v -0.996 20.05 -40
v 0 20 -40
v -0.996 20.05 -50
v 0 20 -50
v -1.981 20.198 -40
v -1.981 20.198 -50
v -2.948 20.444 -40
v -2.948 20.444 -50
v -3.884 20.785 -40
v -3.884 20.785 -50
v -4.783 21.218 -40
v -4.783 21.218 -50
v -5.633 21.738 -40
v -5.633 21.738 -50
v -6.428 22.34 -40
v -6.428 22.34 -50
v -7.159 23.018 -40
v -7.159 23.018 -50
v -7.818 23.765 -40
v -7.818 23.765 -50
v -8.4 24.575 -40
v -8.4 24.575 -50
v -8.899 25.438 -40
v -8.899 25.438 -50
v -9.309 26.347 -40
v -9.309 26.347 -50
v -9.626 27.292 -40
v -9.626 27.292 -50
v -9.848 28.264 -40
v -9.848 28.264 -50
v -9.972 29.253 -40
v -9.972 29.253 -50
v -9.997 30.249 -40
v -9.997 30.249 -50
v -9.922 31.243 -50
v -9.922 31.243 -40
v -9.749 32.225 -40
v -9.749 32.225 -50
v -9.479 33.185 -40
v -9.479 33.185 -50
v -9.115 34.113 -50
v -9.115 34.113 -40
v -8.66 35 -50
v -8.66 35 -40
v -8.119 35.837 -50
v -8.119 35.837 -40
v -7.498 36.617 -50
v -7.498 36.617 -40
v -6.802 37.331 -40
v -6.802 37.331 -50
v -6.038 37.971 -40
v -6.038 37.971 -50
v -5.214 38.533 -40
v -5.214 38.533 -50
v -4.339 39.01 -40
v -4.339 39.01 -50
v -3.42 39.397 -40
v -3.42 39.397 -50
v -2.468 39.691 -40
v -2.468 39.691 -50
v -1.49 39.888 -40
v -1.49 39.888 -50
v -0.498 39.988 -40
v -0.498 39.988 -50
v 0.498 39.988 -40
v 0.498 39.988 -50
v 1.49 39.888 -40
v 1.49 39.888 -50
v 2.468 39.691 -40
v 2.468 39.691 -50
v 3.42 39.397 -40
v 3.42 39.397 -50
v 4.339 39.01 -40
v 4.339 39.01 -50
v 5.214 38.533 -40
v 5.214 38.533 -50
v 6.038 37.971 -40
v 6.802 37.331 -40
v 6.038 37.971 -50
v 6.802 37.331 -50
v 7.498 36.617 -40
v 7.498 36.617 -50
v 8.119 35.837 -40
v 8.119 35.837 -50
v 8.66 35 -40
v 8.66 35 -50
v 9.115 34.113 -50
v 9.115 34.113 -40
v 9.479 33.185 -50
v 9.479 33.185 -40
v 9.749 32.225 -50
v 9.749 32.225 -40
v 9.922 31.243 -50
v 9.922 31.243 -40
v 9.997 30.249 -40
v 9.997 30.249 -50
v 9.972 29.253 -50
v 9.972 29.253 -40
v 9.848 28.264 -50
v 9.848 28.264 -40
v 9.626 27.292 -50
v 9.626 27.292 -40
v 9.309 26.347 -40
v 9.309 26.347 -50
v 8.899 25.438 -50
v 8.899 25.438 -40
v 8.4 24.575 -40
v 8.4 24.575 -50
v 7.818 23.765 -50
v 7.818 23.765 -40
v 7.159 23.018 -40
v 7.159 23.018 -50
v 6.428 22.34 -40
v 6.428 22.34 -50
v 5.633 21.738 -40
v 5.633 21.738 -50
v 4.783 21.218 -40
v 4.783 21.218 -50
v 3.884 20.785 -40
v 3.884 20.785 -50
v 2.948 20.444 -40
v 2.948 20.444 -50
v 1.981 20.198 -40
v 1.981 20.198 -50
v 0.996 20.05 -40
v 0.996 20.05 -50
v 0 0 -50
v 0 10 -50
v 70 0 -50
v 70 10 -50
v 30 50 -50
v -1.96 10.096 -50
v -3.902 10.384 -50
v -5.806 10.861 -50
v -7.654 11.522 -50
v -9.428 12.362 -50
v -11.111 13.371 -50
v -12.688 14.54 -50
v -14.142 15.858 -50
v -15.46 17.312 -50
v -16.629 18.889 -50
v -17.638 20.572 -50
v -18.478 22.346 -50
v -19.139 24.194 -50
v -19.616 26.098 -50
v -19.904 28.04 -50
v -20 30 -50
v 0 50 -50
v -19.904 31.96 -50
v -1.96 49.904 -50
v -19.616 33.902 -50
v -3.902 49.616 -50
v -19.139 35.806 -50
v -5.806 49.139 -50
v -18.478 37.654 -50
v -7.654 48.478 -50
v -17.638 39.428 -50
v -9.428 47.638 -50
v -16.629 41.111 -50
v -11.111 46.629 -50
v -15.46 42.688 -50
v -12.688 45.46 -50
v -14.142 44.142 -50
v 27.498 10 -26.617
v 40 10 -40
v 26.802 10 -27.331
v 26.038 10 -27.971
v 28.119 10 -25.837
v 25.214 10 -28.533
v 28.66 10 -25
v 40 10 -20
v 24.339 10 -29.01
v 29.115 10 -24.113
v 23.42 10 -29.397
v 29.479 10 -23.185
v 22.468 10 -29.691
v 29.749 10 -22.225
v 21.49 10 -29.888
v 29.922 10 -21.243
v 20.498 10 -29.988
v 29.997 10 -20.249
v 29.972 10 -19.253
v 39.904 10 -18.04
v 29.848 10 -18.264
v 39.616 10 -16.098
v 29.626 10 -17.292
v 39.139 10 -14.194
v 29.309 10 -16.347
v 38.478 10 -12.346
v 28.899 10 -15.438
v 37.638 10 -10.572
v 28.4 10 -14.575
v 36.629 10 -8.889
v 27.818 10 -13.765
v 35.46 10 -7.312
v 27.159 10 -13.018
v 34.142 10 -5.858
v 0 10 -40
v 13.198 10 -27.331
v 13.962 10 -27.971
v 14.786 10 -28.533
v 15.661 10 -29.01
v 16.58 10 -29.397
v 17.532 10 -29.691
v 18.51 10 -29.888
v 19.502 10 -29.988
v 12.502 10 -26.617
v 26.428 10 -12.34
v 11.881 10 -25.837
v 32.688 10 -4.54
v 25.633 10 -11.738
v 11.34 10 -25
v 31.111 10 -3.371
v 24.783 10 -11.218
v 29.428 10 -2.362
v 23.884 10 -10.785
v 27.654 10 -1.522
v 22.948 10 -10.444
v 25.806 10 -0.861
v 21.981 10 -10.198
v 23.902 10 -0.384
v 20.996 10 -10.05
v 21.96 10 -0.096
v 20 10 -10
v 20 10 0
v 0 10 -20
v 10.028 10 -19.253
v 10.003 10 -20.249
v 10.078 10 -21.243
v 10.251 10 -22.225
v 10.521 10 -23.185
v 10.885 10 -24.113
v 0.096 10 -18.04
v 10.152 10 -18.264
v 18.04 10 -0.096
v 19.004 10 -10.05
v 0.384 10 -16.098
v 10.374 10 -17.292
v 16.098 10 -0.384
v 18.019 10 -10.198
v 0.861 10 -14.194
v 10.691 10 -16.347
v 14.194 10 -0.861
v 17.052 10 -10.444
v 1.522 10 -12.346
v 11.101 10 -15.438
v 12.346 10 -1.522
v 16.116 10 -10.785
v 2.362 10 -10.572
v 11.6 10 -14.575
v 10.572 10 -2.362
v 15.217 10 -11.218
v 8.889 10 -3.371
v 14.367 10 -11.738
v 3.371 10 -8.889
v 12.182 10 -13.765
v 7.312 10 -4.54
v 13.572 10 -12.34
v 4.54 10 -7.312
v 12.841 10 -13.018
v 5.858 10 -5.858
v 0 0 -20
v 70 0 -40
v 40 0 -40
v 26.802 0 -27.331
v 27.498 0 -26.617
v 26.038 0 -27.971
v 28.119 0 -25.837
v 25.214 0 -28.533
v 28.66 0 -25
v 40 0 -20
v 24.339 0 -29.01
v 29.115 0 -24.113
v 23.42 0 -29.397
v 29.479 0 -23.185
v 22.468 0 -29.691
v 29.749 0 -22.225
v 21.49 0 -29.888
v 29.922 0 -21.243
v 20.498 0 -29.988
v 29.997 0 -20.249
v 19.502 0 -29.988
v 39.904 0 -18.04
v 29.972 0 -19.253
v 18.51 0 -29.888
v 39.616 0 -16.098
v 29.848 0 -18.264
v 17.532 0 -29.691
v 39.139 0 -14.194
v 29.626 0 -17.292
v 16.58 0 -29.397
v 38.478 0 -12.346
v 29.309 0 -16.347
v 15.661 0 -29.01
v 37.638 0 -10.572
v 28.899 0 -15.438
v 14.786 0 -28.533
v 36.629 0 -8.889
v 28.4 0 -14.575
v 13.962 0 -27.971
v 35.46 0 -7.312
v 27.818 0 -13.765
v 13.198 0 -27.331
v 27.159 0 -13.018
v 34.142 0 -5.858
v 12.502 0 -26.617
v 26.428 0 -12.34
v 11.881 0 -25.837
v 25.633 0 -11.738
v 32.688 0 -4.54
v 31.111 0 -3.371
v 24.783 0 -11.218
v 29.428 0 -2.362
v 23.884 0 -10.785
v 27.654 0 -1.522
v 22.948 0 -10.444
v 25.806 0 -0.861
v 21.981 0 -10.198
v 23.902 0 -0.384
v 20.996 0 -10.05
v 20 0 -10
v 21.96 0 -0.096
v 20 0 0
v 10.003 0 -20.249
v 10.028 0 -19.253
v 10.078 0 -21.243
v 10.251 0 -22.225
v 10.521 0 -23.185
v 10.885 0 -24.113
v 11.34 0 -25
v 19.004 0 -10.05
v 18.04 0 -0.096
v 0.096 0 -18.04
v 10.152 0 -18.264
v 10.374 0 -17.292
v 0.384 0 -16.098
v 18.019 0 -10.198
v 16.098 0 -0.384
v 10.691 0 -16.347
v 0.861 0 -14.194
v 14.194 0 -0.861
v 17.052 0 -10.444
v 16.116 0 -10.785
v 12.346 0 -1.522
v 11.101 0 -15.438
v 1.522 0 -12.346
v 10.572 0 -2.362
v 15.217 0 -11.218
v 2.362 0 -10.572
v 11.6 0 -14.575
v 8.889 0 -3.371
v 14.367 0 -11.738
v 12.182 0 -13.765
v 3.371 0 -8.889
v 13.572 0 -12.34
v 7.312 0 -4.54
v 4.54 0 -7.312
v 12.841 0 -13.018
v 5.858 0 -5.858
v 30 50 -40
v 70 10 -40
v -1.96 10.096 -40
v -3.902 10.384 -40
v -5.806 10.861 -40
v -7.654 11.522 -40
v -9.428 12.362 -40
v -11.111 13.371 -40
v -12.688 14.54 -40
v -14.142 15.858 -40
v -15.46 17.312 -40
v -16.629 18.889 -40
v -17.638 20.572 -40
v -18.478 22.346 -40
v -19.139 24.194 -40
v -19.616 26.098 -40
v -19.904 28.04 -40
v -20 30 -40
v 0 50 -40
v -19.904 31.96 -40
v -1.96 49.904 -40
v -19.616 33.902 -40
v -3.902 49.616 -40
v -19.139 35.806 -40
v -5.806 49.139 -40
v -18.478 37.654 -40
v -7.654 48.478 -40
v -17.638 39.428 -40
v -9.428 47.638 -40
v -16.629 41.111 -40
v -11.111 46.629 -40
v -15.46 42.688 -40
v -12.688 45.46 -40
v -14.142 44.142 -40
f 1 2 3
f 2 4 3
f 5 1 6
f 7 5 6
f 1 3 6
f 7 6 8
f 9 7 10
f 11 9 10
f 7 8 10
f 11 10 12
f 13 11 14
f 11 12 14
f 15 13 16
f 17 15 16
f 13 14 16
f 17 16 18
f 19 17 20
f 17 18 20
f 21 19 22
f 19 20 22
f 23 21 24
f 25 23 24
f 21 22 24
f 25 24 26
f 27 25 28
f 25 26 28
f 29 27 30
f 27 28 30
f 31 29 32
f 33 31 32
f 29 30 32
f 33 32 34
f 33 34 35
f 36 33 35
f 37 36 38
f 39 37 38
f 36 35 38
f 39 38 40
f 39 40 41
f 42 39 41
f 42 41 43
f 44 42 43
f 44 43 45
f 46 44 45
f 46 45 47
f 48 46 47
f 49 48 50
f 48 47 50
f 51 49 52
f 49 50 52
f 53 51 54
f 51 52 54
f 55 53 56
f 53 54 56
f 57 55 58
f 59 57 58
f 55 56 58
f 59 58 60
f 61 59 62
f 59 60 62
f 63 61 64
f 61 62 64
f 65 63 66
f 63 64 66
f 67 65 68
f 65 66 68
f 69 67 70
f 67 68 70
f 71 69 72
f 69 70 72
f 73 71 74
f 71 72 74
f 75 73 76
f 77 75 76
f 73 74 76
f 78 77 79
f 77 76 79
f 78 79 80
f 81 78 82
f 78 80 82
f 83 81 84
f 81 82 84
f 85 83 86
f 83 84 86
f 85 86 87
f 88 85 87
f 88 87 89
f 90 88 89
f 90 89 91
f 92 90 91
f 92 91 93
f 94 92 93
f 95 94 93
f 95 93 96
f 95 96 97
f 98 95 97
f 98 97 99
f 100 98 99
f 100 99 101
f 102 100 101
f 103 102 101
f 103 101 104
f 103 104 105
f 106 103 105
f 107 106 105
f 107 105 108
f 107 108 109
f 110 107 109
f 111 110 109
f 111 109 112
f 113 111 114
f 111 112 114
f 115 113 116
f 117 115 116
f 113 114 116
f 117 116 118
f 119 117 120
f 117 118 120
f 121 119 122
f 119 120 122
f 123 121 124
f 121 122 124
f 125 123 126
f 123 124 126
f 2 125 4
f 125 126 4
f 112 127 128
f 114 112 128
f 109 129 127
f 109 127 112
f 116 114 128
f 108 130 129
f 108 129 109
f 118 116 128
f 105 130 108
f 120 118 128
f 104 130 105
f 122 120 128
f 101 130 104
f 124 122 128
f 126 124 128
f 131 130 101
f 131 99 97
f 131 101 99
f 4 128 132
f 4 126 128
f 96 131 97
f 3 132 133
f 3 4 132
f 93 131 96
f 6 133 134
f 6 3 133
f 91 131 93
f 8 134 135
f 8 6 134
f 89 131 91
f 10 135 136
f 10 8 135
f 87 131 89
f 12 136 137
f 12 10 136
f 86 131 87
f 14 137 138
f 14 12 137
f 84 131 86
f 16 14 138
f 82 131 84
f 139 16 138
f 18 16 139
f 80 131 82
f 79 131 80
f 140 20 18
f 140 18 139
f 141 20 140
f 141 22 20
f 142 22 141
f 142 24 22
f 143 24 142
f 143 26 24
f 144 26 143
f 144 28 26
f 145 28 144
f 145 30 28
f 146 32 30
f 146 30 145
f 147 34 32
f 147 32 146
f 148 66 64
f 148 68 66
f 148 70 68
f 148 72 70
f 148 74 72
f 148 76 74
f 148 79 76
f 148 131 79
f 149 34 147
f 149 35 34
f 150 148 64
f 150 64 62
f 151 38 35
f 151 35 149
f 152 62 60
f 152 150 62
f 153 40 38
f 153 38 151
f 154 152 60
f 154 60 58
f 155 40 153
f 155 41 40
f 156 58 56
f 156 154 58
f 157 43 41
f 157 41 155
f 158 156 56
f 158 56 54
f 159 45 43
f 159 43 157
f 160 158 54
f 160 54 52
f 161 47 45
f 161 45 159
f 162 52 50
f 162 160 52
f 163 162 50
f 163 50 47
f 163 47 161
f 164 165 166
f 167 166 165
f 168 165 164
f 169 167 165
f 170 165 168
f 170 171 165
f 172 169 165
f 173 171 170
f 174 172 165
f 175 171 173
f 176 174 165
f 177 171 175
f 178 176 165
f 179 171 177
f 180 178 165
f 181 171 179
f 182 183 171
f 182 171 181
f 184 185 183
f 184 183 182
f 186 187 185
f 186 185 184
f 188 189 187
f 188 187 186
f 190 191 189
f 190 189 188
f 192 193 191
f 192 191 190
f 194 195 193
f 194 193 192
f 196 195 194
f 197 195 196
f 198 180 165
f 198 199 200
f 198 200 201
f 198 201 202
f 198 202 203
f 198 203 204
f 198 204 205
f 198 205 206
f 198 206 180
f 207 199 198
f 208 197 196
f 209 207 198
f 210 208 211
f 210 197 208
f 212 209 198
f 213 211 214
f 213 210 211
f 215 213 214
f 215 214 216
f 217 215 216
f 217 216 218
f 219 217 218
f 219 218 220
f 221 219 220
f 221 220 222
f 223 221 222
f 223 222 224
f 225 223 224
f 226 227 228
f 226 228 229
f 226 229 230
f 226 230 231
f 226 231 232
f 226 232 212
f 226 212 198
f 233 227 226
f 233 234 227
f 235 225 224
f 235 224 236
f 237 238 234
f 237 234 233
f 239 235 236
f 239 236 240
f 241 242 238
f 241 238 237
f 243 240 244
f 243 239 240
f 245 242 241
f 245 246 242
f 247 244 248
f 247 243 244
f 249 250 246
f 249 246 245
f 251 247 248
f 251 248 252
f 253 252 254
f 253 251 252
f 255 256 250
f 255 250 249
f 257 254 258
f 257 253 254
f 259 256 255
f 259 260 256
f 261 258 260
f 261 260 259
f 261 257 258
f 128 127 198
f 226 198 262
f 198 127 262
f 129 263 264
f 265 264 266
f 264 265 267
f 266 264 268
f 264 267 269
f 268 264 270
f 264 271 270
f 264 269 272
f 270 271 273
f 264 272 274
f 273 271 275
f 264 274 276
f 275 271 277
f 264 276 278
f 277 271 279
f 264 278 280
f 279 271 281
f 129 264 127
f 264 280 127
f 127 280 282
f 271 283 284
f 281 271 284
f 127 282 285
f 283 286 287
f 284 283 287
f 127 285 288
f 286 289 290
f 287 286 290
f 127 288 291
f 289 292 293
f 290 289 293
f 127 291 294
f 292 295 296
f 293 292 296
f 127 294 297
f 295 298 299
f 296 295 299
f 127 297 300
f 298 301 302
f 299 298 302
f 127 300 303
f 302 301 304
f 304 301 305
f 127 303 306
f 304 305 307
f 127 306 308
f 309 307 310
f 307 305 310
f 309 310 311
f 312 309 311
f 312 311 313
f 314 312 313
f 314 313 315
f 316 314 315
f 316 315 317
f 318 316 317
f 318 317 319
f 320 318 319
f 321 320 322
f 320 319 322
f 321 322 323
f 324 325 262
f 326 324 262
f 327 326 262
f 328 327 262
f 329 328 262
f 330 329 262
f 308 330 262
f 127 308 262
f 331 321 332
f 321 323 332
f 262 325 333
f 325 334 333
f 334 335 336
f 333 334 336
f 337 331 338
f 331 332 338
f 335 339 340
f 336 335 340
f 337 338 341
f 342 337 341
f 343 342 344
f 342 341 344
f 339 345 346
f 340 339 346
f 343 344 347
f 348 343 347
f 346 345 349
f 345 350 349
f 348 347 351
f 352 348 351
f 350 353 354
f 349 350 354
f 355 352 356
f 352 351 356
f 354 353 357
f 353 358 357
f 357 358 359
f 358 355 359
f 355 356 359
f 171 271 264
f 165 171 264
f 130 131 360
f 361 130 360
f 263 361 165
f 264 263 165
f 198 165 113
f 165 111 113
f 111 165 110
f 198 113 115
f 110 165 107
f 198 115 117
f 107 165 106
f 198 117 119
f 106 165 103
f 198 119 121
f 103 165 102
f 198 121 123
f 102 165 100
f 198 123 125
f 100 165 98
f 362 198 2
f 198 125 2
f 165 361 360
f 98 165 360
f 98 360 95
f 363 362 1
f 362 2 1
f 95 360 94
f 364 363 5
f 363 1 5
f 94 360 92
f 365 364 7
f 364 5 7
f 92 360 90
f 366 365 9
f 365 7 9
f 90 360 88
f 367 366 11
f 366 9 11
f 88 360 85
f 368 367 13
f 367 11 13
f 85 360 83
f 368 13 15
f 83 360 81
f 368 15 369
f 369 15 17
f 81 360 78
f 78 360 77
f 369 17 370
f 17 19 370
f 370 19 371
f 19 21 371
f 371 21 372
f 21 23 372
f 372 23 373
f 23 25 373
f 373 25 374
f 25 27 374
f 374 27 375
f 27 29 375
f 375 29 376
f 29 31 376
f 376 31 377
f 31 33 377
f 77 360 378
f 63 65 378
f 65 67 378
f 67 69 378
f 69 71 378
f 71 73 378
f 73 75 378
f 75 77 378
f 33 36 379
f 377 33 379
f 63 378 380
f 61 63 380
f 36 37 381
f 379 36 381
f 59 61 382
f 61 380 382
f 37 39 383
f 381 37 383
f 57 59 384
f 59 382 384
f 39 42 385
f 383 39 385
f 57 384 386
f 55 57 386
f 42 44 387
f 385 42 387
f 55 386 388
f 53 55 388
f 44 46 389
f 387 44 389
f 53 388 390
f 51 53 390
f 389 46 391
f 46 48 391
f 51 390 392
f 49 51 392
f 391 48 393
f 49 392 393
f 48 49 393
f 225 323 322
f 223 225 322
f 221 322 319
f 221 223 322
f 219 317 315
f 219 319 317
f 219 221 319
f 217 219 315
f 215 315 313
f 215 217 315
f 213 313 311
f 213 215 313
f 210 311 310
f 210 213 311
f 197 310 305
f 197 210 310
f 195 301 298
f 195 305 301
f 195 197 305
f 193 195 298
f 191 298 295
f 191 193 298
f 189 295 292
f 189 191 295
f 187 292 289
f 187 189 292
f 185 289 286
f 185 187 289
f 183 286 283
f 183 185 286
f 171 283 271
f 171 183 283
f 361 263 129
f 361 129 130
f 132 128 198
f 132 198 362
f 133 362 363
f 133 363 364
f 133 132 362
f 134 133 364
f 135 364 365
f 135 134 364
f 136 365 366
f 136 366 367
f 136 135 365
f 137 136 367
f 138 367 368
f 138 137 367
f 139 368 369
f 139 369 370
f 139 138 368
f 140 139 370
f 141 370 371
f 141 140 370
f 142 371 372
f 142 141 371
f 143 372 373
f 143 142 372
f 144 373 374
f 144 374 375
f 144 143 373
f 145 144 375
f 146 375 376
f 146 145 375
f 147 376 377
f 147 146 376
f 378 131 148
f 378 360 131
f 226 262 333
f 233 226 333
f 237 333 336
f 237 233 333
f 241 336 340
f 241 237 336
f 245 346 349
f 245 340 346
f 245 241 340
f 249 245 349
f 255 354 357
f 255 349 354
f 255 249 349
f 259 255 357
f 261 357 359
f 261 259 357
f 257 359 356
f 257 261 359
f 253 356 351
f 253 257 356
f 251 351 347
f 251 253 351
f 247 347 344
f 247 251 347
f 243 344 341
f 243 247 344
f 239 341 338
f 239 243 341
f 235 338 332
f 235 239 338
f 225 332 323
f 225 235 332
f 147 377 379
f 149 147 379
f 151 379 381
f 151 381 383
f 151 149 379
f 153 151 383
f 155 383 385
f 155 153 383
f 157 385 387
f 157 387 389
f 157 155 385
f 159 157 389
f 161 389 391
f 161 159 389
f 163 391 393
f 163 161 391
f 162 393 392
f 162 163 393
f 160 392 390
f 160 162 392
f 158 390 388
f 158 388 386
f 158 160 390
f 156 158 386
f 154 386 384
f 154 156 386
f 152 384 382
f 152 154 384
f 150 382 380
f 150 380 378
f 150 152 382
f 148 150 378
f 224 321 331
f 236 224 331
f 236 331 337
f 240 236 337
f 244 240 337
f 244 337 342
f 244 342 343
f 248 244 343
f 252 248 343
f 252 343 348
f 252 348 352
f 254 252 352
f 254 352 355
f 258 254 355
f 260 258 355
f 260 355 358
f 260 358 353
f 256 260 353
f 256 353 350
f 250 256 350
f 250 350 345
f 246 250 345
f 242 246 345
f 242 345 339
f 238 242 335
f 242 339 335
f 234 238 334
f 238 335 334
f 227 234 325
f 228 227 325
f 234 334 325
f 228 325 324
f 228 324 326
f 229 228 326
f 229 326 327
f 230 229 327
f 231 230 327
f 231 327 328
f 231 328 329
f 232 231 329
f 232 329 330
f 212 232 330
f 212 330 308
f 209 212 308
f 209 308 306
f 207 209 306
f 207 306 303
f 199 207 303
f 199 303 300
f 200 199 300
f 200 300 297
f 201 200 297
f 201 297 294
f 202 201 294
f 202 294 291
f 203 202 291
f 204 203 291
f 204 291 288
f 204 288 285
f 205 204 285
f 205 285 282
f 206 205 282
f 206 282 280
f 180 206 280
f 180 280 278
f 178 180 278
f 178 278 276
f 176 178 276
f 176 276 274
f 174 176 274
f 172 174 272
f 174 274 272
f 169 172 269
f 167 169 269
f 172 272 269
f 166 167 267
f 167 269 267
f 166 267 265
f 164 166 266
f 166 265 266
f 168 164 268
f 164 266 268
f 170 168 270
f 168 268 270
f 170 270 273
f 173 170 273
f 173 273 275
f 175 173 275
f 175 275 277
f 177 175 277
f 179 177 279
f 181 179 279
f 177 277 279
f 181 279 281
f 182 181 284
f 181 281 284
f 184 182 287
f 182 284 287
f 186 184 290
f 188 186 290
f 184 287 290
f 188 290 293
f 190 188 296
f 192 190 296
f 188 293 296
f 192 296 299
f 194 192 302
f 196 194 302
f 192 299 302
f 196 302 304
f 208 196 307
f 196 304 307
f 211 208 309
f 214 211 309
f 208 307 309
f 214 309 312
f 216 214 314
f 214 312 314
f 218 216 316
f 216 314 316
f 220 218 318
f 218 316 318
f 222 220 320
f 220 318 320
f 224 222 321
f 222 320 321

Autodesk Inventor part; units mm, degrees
ref_plane "YZ Plane" through (0, 0, 0) normal (1, 0, 0) x (0, 1, 0)
ref_plane "XZ Plane" through (0, 0, 0) normal (0, 1, 0) x (-1, 0, 0)
ref_plane "XY Plane" through (0, 0, 0) normal (0, 0, 1) x (1, 0, 0)
sketch "草圖1" plane through (0, 0, 0) normal (0, 1, 0) x (-1, 0, 0)
  line L0 (0, 0) -> (-40, 0)
  line L1 (-40, 0) -> (-40, -40)
  line L2 (-40, -40) -> (0, -40)
  line L3 (0, -40) -> (0, 0)
  dimension "d0" = 40
  dimension "d1" = 40
extrude "擠出1" add sketch "草圖1" along normal blind 10
sketch "草圖2" plane through (40, 0, -40) normal (0, 0, -1) x (-1, 0, 0)
  line L0 (40, 0) -> (0, 0) projected
  line L1 (40, 0) -> (-30, 0)
  line L2 (-30, 0) -> (-30, 50)
  line L3 (-30, 50) -> (40, 50)
  line L4 (40, 50) -> (40, 0)
  line L5 (40, 10) -> (0, 10) projected
  line L6 (40, 10) -> (60, 10)
  line L7 (60, 10) -> (60, 50)
  line L8 (60, 50) -> (40, 50)
  line L9 (40, 50) -> (40, 10)
  line L10 (0, 0) -> (0, 10) projected
  dimension "d4" = 40
  dimension "d5" = 30
  dimension "d6" = 20
extrude "擠出2" add sketch "草圖2" along normal blind 10
fillet "圓角1" radius 20 2 edges at (-20, 50, -45) (-20, 10, -45)
chamfer "倒角1" distance 40 angle 45 1 edges at (70, 50, -45)
fillet "圓角2" radius 20 2 edges at (0, 5, 0) (40, 5, 0)
hole "孔1" at (20, 10, -20) direction (0, -1, 0) diameter 20 depth 10 tip angle 118
hole "孔2" at (0, 30, -40) direction (0, 0, -1) diameter 20 depth 20 tip angle 118
properties part number "25"
